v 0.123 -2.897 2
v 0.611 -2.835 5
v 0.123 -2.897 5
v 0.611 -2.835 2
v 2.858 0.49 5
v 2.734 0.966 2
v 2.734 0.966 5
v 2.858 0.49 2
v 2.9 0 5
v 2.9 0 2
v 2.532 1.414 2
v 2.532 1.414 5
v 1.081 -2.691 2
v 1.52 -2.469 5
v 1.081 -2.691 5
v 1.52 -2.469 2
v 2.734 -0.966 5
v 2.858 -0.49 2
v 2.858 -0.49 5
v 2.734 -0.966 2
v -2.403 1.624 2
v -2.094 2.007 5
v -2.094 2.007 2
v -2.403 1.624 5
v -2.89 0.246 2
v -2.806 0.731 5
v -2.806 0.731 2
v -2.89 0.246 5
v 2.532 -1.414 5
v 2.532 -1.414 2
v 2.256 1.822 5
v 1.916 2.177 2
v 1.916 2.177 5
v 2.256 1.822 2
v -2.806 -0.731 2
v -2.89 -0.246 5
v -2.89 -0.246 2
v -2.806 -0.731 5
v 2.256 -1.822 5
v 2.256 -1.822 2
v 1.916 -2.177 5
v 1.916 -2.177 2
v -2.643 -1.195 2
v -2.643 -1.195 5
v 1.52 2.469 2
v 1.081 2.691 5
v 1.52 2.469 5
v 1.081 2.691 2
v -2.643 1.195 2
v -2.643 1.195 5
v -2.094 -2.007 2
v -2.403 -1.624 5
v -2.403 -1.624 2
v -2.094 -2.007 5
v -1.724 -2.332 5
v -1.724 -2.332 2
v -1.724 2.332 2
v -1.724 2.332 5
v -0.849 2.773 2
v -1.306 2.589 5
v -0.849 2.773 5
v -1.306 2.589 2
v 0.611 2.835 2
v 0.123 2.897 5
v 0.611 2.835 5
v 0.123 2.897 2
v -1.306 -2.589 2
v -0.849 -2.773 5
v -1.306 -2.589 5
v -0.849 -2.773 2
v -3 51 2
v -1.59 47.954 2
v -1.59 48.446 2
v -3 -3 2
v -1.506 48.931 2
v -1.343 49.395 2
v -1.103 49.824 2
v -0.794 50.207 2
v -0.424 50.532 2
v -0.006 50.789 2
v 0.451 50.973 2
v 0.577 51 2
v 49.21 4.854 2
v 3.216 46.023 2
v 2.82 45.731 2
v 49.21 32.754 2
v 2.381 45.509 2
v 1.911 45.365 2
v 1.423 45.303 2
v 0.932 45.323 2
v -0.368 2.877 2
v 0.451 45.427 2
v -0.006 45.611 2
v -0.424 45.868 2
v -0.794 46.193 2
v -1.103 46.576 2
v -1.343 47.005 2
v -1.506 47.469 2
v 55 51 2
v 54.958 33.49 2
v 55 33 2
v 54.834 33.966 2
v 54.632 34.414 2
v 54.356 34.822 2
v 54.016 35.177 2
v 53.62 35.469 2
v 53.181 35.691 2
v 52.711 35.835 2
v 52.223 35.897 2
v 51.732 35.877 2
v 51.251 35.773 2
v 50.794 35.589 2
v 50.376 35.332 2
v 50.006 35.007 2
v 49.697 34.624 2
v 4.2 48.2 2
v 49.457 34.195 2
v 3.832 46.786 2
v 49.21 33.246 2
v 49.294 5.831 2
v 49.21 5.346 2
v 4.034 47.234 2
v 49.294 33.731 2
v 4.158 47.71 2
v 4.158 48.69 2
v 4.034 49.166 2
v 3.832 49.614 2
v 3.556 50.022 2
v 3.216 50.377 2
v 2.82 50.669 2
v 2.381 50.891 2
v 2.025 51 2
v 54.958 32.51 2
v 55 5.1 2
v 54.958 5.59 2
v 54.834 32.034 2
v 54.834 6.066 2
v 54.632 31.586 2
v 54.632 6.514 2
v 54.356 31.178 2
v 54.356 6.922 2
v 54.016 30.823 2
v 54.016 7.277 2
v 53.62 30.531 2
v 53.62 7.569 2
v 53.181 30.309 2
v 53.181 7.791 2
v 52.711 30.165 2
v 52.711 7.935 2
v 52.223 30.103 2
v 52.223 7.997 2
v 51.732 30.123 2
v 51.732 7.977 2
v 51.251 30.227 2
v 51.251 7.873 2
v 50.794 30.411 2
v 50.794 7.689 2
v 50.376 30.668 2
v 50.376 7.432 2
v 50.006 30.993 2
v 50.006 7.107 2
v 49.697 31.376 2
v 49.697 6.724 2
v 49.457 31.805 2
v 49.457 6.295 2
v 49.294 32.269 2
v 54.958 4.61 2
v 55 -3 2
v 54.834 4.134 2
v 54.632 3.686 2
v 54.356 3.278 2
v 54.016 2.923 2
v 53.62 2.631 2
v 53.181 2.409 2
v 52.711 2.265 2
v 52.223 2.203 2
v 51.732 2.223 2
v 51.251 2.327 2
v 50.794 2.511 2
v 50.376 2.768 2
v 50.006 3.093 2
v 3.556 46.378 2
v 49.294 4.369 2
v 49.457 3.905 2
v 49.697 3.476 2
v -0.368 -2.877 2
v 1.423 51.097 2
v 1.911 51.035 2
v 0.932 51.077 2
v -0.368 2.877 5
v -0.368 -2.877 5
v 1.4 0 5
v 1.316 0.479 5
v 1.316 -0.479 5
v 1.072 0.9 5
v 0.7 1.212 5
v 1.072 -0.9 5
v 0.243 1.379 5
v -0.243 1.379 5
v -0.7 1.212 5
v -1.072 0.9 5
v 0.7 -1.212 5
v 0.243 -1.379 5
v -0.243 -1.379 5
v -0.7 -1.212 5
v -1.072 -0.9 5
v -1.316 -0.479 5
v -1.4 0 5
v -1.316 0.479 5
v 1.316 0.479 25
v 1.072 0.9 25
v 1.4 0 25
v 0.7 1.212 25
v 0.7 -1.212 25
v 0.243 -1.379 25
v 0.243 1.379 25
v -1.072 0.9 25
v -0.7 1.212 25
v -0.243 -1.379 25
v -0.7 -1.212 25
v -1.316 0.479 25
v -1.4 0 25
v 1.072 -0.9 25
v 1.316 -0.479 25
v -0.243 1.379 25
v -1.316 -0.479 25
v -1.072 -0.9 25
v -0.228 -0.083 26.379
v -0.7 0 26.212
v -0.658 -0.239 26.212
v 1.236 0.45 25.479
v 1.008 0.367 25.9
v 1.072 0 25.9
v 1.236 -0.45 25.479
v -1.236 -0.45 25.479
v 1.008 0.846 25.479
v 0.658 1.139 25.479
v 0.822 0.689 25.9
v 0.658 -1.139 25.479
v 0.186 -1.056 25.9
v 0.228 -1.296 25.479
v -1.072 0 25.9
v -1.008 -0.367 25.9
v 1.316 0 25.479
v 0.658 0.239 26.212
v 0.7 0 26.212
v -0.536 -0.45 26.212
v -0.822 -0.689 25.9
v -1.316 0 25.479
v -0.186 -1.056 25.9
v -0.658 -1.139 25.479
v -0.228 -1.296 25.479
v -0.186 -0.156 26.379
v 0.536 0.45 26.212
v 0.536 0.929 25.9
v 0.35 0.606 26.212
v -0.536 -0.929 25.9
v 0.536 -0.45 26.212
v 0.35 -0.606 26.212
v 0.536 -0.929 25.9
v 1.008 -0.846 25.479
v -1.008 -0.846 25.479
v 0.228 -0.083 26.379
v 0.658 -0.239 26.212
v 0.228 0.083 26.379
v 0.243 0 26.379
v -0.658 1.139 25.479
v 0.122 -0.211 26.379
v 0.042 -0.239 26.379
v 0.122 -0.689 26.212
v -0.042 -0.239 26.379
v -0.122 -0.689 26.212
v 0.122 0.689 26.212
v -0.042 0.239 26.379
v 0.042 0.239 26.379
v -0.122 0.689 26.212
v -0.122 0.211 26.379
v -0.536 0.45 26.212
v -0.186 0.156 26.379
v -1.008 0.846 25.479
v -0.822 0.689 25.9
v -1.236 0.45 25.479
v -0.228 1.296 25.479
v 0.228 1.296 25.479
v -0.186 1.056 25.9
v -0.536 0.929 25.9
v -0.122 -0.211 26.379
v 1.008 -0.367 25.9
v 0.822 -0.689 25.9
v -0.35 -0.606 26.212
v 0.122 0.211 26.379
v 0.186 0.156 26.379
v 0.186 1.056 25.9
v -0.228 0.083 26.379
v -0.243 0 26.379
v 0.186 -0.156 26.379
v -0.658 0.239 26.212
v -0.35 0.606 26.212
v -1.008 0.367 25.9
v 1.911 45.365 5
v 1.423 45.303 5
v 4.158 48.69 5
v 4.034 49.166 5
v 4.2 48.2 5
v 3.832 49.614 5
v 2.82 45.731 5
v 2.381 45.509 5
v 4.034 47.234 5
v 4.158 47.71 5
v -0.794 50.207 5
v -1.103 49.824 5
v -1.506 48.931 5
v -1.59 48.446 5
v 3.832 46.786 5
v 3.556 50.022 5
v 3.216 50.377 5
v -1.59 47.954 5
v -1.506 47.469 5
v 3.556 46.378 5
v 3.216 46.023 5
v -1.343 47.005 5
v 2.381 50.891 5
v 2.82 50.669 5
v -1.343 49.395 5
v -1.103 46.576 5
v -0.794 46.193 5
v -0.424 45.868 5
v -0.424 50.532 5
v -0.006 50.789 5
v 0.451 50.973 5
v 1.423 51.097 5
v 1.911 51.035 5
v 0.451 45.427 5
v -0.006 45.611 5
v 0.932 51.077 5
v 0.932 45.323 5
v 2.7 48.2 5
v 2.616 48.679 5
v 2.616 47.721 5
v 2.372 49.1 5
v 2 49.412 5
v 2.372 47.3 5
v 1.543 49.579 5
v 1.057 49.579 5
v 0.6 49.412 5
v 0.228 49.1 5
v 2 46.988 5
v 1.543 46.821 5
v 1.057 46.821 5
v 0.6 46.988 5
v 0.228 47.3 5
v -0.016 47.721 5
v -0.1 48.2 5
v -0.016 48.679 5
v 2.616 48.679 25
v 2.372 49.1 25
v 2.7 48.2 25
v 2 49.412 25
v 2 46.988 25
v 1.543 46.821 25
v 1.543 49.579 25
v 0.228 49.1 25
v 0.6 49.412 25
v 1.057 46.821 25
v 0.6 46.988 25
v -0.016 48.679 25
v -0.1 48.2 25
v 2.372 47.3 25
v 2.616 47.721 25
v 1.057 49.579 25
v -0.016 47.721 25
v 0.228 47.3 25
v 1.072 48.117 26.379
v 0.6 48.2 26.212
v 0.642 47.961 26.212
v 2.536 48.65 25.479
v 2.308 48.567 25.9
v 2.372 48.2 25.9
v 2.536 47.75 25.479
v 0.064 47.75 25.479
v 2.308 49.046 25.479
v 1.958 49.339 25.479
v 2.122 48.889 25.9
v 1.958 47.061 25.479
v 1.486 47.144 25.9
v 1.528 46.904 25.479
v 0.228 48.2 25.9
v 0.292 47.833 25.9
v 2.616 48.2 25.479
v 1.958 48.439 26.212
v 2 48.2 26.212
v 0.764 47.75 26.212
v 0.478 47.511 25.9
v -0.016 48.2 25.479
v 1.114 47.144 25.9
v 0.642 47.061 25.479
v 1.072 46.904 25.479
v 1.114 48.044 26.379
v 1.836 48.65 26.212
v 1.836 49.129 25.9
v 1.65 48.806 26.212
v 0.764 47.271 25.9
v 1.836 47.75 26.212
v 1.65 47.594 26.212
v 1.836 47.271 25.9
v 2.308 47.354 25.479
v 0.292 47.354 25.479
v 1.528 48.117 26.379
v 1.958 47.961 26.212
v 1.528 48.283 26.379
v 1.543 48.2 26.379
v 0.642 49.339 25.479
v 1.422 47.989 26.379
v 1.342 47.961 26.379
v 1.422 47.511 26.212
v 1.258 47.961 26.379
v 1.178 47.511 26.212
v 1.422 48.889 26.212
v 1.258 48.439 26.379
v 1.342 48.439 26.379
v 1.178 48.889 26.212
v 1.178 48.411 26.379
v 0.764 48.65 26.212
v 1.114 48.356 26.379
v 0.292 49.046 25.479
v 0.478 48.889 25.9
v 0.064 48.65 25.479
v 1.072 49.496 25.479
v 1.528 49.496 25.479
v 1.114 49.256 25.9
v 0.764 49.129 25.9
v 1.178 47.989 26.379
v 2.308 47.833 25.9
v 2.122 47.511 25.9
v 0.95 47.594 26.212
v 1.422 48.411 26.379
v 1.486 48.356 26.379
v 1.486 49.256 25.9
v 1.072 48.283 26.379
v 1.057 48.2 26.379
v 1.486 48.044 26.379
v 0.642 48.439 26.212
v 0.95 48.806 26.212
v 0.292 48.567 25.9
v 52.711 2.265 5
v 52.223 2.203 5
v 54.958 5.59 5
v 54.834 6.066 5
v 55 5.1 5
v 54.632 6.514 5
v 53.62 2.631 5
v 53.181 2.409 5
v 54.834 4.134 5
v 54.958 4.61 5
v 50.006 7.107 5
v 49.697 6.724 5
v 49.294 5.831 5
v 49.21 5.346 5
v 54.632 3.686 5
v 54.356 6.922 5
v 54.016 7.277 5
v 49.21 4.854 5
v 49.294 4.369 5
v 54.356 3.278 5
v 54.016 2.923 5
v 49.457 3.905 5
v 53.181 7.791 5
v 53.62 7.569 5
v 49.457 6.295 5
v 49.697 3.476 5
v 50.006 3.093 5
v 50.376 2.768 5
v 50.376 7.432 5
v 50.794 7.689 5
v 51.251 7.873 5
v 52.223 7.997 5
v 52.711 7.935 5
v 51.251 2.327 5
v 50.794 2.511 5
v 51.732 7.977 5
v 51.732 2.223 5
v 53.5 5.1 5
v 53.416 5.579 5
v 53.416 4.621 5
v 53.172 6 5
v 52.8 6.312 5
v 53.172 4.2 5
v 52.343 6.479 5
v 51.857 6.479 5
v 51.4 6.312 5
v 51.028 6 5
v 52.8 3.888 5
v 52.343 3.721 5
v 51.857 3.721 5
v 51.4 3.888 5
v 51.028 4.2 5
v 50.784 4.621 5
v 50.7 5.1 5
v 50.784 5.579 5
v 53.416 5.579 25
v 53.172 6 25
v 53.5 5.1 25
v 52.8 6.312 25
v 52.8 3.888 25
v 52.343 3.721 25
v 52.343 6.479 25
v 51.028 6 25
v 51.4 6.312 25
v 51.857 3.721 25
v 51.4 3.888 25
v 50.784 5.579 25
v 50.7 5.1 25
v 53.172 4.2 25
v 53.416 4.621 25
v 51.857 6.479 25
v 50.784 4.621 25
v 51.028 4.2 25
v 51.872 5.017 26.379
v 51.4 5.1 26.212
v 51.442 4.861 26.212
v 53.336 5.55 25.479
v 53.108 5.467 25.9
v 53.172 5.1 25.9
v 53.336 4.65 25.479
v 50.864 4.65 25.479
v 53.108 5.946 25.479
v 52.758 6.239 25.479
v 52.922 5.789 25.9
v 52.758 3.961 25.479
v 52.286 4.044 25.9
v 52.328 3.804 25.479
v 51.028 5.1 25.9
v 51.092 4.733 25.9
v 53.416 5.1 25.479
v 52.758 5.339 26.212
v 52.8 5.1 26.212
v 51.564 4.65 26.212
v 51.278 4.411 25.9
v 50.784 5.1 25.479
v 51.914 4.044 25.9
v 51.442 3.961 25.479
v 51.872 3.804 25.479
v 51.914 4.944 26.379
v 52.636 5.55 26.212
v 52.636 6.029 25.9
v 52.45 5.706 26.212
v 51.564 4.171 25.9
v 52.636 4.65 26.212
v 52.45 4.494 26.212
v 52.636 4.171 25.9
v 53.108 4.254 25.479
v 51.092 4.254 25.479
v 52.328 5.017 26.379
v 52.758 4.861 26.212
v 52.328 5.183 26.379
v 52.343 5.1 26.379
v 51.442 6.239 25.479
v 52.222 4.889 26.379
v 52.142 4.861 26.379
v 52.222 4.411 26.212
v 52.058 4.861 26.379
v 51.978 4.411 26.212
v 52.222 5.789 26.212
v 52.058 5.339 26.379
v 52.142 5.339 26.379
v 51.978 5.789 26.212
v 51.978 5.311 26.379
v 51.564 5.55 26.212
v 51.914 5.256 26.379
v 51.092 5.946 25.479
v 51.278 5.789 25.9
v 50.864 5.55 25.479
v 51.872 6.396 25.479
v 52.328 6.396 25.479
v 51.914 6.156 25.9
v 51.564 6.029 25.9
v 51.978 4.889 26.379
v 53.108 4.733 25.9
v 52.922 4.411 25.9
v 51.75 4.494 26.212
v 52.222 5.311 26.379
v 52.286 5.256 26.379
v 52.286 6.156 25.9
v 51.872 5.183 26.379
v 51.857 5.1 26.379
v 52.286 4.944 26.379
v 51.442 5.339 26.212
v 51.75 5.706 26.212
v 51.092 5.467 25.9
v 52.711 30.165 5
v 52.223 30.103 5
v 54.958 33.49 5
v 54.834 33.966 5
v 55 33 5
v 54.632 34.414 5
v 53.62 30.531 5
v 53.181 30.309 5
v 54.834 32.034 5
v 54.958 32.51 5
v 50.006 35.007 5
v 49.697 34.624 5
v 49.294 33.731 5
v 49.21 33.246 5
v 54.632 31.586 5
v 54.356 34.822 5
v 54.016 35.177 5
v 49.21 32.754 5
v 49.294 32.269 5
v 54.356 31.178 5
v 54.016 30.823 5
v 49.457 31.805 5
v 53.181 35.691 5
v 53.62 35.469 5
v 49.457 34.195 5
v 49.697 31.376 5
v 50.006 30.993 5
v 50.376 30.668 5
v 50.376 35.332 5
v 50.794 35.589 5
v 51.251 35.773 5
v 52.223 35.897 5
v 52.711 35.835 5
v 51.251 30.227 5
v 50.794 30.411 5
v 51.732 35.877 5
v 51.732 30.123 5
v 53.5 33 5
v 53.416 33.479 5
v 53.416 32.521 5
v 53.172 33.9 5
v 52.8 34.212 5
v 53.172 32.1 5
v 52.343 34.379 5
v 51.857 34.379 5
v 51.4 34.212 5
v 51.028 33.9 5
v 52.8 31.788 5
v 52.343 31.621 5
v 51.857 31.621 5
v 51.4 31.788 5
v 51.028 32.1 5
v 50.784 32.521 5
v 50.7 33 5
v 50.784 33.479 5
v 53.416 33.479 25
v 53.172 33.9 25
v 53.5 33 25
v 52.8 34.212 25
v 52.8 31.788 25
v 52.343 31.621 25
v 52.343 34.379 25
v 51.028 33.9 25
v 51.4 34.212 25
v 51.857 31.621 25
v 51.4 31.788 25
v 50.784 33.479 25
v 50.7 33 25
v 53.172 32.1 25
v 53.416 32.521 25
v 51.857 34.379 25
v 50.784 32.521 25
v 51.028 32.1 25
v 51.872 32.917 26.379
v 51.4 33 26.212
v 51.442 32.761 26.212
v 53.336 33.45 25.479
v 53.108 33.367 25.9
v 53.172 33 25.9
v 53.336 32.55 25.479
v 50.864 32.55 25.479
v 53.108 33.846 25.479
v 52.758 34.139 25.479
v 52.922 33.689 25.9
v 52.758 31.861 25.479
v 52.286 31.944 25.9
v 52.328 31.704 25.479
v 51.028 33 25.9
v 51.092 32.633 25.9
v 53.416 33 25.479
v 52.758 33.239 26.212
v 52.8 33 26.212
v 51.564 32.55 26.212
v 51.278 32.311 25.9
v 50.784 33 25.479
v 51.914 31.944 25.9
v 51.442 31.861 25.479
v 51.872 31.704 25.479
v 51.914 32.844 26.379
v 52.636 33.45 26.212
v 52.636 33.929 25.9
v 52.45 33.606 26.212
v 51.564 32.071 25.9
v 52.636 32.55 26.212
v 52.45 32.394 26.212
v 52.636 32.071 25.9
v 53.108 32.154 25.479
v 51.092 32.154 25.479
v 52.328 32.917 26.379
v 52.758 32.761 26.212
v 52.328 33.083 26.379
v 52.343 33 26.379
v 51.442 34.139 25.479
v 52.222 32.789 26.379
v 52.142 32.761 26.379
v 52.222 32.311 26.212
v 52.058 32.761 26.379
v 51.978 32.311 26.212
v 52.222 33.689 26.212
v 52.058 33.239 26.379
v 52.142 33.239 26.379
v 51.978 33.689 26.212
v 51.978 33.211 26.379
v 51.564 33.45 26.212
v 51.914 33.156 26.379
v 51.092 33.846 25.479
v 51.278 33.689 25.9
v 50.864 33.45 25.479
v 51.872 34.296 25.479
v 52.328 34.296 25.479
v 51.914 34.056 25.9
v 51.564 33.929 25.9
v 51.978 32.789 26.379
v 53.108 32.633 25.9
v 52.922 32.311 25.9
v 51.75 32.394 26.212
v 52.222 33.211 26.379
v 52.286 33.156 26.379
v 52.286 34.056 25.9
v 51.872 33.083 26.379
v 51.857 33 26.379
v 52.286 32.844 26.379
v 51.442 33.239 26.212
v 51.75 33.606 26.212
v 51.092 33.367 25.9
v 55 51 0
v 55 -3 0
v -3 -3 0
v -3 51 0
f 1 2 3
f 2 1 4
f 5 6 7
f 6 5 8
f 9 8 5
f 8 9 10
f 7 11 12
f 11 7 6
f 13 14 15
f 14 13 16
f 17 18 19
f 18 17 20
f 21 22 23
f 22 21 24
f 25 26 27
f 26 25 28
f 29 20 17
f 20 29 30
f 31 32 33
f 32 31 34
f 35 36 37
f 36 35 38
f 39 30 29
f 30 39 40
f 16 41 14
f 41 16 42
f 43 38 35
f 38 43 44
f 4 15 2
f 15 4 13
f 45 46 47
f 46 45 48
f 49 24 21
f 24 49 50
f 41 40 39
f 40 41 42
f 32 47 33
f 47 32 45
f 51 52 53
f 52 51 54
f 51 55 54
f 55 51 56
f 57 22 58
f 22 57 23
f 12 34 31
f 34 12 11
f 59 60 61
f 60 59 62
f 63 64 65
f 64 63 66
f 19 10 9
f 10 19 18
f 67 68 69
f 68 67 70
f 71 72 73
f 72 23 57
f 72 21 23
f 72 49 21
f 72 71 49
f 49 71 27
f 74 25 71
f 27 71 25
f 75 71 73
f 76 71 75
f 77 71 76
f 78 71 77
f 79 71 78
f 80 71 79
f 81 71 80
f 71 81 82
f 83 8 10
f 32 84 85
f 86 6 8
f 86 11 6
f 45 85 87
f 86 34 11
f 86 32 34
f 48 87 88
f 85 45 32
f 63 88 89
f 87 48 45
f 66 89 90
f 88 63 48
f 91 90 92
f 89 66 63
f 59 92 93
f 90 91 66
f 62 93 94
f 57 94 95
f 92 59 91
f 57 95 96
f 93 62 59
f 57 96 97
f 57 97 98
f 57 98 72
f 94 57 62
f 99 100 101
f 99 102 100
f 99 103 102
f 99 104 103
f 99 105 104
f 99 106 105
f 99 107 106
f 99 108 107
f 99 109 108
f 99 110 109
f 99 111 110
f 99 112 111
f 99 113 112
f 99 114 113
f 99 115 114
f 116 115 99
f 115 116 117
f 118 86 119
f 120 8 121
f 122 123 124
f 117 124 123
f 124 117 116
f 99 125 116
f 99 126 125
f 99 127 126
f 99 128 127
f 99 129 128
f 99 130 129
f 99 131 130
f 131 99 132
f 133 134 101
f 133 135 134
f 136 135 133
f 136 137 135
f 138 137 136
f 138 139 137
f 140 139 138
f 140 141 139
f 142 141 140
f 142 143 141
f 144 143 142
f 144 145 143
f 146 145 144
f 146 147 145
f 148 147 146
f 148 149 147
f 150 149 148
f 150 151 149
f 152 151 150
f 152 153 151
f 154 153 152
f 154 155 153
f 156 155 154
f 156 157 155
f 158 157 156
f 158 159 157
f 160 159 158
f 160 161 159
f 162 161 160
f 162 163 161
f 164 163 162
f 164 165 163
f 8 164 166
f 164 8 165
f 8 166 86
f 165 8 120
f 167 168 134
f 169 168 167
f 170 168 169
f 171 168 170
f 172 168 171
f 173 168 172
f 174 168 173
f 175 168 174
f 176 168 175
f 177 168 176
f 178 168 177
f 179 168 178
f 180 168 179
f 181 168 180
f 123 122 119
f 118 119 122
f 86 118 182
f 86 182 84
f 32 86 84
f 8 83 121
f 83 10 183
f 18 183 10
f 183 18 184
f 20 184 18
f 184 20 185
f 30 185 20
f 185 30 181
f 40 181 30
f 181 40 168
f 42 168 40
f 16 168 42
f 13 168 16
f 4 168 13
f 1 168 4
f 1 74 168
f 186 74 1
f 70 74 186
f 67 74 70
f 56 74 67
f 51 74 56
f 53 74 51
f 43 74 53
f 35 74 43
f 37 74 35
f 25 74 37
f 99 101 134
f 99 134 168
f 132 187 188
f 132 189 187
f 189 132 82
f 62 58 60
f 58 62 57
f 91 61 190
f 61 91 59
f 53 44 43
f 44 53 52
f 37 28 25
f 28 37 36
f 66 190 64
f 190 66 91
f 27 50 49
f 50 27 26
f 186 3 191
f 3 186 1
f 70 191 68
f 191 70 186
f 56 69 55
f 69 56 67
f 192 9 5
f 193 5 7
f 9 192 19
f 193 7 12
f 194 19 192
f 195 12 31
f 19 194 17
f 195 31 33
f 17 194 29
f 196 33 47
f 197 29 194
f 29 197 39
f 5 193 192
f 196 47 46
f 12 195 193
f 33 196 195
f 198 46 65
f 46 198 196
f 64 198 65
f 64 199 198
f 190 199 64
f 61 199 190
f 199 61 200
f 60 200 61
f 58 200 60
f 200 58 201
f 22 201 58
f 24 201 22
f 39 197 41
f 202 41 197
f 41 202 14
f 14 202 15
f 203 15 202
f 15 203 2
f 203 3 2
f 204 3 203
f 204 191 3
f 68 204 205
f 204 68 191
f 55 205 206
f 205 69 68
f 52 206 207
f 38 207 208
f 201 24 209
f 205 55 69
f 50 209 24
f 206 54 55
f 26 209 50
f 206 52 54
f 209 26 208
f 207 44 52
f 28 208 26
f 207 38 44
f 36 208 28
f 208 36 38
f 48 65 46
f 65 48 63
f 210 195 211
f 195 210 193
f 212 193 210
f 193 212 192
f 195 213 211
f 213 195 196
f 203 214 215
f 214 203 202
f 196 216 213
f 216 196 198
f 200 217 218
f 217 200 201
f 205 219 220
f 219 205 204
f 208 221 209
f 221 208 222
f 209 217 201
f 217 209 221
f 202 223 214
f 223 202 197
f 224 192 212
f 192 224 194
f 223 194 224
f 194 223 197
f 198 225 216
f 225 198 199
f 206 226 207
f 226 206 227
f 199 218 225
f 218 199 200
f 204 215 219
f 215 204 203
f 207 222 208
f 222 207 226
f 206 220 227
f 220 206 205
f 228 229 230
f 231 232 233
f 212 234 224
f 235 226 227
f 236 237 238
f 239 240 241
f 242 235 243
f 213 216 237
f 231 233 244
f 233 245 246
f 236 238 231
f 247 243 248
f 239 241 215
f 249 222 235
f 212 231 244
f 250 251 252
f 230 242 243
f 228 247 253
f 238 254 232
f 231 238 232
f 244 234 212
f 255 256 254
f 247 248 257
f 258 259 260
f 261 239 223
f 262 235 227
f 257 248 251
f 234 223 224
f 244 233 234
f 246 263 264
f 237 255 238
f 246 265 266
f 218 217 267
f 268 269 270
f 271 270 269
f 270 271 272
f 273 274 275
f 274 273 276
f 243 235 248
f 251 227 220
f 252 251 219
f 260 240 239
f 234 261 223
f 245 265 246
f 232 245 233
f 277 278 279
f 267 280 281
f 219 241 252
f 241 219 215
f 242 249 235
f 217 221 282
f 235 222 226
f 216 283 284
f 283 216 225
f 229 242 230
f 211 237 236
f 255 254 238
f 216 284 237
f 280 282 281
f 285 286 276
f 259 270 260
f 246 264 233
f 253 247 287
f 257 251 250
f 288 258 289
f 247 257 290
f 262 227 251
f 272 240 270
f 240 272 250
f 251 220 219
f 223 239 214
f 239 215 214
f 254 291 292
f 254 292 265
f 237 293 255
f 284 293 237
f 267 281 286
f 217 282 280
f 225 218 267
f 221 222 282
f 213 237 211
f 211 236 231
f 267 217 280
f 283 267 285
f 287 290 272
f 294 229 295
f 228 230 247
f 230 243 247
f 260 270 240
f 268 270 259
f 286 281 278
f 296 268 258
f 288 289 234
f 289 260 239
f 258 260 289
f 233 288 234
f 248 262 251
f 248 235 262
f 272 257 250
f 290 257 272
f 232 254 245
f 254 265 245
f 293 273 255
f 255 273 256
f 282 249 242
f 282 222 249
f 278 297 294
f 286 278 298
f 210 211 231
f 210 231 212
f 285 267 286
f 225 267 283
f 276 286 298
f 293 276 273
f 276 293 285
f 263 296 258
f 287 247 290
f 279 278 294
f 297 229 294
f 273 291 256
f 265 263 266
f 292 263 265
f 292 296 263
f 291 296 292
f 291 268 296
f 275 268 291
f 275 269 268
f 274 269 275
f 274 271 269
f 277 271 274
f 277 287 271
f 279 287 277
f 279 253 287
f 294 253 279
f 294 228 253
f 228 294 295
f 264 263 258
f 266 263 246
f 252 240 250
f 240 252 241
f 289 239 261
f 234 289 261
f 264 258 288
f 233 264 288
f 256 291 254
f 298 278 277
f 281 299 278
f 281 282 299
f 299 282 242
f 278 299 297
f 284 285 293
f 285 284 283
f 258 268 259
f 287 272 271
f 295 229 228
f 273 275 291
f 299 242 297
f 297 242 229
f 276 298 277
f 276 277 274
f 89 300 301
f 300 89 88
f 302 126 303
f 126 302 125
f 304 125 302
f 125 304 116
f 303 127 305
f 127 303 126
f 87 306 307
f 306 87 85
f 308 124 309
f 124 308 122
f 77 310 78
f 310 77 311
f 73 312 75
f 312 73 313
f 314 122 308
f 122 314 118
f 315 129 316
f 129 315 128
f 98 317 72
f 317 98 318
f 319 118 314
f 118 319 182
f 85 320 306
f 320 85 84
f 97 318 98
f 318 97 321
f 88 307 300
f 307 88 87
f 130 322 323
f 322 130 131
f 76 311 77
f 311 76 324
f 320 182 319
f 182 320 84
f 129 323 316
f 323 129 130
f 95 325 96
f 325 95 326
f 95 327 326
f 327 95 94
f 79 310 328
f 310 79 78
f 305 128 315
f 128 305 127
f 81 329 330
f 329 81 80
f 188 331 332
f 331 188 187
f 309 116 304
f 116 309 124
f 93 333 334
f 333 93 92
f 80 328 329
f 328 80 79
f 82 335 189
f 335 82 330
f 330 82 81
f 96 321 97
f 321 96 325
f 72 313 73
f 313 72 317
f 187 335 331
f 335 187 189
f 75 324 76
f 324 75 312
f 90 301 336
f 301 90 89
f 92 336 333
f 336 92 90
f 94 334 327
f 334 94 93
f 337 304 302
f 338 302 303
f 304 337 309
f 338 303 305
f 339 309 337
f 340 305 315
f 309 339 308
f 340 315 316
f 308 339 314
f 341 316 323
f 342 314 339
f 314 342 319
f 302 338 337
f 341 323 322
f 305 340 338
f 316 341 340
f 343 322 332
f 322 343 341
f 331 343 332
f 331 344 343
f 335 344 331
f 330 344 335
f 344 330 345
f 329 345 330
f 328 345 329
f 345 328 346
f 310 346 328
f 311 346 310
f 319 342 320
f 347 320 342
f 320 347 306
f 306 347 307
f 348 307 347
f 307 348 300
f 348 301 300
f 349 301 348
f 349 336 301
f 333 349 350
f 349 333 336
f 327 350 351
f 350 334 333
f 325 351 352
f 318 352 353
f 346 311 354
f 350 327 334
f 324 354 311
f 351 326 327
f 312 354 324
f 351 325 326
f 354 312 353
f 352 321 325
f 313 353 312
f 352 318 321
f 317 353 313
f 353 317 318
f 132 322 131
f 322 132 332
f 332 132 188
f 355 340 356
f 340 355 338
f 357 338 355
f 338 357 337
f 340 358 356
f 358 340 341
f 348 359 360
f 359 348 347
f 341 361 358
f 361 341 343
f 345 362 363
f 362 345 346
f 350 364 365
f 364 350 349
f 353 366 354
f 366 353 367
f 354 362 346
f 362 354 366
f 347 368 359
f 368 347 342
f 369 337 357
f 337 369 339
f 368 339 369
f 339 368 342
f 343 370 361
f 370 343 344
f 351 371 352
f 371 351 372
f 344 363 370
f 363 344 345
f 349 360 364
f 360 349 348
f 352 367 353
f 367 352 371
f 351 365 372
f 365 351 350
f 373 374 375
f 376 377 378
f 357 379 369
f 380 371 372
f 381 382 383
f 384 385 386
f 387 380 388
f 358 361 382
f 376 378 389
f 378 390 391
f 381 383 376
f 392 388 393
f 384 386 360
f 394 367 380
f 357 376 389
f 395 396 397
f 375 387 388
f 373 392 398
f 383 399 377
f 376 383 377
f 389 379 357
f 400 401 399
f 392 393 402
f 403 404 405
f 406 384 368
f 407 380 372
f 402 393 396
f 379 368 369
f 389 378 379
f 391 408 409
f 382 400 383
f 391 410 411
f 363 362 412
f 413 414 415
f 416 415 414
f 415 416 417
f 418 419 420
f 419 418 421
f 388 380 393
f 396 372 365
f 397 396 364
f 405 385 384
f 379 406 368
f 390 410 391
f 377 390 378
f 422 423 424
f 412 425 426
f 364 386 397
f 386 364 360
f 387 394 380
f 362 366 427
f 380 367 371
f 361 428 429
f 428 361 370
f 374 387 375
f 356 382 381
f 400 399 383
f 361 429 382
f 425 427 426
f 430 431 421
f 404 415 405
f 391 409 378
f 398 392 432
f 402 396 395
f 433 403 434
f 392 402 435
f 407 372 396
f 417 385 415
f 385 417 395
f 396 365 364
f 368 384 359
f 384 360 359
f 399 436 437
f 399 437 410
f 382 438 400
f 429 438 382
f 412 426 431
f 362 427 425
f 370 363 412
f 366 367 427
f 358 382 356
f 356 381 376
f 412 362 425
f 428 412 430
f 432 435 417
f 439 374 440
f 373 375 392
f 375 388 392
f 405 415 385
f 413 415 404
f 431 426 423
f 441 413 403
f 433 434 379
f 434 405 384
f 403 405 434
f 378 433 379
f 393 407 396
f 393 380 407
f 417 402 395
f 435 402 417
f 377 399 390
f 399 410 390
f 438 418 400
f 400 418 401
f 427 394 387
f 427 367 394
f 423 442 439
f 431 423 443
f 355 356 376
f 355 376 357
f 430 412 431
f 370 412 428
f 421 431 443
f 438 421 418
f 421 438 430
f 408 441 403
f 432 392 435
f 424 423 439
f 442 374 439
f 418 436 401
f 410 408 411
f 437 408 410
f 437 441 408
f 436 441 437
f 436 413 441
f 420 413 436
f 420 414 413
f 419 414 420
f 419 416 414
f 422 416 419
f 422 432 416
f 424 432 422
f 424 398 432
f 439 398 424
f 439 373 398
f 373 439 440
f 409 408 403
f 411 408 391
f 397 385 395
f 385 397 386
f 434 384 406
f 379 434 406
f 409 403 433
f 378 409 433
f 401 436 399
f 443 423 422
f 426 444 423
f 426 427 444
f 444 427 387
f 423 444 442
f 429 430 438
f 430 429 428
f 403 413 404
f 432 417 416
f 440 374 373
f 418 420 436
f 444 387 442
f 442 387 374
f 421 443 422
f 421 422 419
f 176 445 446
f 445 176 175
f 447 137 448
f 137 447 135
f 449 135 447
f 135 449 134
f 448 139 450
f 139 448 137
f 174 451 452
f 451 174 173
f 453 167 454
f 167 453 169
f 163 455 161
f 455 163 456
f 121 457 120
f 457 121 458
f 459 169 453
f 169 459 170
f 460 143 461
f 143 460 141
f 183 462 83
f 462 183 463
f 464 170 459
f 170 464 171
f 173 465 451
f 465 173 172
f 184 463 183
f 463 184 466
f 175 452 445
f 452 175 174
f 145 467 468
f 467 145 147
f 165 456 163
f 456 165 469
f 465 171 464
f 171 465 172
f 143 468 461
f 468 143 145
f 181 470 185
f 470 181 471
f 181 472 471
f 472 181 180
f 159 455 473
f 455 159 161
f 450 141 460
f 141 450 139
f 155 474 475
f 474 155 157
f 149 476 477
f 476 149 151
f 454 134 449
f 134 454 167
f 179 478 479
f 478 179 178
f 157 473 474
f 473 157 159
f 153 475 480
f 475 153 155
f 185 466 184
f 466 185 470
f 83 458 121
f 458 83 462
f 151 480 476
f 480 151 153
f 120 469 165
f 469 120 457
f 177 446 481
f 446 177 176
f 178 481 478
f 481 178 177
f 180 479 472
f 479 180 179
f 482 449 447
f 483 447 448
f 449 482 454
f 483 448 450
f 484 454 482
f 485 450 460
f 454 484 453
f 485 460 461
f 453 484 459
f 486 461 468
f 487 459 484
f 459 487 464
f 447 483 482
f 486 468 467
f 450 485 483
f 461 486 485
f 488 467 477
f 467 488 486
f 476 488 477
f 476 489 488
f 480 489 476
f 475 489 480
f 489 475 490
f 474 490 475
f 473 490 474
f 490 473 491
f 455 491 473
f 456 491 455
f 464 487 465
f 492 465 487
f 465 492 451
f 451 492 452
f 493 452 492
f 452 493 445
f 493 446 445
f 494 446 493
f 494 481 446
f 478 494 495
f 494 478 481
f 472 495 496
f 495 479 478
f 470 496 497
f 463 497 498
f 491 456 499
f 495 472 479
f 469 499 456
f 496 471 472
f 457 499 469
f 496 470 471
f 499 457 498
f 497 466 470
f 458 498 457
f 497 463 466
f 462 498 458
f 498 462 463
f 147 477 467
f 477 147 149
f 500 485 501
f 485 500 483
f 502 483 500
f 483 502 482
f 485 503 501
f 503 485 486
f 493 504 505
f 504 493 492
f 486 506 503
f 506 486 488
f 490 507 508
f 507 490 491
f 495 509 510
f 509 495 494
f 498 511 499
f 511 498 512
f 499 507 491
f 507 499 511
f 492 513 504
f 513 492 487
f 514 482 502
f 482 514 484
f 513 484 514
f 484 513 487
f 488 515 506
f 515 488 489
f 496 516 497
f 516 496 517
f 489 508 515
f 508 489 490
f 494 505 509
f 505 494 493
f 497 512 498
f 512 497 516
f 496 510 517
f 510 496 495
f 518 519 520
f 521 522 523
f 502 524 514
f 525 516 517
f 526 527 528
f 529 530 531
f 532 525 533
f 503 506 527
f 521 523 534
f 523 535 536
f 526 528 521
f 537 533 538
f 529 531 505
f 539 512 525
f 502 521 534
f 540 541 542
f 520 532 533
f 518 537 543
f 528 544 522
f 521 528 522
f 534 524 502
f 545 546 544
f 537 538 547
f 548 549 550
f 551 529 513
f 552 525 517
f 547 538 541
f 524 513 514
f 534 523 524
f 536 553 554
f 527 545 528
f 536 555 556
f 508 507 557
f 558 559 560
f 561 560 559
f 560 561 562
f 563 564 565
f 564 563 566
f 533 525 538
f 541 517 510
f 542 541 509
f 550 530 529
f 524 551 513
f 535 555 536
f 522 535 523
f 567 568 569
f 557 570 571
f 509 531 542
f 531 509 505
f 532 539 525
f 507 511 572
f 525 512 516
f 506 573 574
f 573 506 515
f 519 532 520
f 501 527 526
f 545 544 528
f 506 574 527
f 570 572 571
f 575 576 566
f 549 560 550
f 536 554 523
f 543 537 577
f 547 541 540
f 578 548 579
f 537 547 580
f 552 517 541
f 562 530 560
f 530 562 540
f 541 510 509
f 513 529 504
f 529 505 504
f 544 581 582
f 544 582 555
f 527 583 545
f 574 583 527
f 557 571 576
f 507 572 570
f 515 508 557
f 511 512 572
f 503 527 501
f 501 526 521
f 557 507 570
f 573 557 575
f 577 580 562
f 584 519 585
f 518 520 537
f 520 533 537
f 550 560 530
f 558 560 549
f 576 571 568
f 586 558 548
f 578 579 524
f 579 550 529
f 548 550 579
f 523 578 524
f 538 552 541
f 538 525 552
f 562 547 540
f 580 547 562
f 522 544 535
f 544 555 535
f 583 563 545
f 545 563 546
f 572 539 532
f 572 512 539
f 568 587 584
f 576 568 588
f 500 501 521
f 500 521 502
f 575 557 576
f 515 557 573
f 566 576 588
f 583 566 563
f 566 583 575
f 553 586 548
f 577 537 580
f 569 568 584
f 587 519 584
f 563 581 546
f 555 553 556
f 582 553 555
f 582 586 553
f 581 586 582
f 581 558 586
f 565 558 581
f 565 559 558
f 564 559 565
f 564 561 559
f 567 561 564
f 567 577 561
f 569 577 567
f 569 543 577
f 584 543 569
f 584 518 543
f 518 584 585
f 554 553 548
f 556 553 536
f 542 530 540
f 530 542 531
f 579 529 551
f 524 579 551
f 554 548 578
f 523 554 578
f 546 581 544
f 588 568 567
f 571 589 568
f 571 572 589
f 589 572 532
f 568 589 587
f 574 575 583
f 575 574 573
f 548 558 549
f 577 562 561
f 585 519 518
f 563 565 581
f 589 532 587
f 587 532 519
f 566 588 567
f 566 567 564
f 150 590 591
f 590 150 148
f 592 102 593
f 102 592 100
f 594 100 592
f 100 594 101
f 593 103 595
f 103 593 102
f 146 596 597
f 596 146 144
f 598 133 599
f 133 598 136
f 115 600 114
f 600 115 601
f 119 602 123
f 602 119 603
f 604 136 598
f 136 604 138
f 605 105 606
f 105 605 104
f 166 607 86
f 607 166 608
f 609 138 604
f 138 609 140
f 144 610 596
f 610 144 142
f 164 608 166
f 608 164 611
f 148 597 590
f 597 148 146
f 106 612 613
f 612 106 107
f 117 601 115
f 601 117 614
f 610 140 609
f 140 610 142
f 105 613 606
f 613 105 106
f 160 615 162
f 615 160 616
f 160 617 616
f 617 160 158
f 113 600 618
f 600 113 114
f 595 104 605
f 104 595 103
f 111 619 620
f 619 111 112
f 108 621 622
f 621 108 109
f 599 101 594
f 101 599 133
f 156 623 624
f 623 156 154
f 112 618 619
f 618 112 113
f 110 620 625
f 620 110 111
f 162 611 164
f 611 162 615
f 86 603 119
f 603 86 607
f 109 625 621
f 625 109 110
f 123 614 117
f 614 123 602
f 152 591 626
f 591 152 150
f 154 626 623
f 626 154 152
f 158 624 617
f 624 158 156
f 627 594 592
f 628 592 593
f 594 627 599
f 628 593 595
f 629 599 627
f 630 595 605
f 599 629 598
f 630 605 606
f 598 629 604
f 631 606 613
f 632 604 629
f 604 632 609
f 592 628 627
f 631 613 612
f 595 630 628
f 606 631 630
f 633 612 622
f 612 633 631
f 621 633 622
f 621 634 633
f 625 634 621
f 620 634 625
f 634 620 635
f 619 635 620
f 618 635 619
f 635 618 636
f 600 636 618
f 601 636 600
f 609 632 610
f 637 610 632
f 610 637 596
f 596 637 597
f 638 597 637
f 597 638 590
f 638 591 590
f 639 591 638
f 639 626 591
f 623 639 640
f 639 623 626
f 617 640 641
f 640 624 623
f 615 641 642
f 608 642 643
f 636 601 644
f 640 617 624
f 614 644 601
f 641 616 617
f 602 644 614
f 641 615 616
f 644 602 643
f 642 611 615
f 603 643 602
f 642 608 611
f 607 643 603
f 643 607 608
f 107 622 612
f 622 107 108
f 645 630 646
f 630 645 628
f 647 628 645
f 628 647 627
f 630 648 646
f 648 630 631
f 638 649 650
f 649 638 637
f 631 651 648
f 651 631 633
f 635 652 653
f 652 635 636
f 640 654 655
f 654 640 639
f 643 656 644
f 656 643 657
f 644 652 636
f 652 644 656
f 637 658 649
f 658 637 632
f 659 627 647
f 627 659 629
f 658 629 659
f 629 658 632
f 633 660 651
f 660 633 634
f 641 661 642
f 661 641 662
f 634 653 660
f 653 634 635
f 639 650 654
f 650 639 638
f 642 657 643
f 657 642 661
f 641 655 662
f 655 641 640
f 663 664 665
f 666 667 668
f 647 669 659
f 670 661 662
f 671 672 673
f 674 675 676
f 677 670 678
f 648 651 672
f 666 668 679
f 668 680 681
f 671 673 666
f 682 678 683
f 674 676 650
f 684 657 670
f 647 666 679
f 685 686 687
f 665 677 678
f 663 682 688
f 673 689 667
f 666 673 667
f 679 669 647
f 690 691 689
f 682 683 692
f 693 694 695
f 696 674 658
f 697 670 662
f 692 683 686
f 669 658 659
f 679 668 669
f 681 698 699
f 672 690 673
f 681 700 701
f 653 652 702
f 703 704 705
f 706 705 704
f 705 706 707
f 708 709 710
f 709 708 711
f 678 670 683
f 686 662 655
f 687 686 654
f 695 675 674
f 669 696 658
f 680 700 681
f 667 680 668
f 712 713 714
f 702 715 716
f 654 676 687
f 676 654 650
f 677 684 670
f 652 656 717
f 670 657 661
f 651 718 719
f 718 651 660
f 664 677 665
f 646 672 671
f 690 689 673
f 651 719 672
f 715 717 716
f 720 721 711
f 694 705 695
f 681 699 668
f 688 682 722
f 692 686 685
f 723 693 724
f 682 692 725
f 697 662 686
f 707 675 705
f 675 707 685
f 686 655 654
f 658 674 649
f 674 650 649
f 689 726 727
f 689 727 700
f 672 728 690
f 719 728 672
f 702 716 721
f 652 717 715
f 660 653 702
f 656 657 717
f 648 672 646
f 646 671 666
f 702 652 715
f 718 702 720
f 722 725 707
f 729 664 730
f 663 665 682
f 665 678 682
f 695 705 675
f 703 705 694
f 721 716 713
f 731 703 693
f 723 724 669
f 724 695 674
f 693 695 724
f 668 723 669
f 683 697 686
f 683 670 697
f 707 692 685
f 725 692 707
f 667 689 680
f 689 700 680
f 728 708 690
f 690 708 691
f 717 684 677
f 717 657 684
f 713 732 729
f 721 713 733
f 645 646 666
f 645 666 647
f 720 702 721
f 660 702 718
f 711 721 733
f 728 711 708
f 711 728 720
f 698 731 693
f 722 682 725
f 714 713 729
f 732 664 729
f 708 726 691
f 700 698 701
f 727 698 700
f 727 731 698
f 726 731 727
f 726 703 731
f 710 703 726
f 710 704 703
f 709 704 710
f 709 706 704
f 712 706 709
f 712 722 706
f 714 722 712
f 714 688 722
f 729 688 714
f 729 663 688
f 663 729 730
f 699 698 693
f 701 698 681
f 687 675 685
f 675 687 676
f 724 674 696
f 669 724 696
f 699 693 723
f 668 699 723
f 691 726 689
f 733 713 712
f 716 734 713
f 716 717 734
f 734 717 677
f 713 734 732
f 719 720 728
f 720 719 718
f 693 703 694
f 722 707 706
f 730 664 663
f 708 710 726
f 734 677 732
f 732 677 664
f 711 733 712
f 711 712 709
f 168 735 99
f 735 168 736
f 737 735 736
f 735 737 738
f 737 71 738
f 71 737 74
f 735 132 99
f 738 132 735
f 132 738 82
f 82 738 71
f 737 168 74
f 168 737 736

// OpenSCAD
$fa=4;
$fs=0.5;

tolerance=0.15;

arduino_mount(peg=20);

module support_peg(radius, thickness, height, peg) {
	union() {
		cylinder(r= radius + thickness, h = height);	
		cylinder(r= radius, h = height + peg);
		translate([0,0,height + peg]) sphere(r = radius);
	}
}


module arduino_mount(height = 3, peg = 5, t = 2) {
	//http://www.adafruit.com/datasheets/arduino_hole_dimensions.pdf
	//PCB (without connector): 54 x 70mm
	radius = 2.8 / 2; //hole is 3.2
	thickness = 1.5;
	union(){
		translate([  -3,    -3, 0]) cube([58, 54, t]);
		translate([   0,    0, t]) support_peg(radius, thickness, height, peg);
		translate([ 1.3, 48.2, t]) support_peg(radius, thickness, height, peg);
		translate([52.1,  5.1, t]) support_peg(radius, thickness, height, peg);
		translate([52.1,   33, t]) support_peg(radius, thickness, height, peg);
	}
}
